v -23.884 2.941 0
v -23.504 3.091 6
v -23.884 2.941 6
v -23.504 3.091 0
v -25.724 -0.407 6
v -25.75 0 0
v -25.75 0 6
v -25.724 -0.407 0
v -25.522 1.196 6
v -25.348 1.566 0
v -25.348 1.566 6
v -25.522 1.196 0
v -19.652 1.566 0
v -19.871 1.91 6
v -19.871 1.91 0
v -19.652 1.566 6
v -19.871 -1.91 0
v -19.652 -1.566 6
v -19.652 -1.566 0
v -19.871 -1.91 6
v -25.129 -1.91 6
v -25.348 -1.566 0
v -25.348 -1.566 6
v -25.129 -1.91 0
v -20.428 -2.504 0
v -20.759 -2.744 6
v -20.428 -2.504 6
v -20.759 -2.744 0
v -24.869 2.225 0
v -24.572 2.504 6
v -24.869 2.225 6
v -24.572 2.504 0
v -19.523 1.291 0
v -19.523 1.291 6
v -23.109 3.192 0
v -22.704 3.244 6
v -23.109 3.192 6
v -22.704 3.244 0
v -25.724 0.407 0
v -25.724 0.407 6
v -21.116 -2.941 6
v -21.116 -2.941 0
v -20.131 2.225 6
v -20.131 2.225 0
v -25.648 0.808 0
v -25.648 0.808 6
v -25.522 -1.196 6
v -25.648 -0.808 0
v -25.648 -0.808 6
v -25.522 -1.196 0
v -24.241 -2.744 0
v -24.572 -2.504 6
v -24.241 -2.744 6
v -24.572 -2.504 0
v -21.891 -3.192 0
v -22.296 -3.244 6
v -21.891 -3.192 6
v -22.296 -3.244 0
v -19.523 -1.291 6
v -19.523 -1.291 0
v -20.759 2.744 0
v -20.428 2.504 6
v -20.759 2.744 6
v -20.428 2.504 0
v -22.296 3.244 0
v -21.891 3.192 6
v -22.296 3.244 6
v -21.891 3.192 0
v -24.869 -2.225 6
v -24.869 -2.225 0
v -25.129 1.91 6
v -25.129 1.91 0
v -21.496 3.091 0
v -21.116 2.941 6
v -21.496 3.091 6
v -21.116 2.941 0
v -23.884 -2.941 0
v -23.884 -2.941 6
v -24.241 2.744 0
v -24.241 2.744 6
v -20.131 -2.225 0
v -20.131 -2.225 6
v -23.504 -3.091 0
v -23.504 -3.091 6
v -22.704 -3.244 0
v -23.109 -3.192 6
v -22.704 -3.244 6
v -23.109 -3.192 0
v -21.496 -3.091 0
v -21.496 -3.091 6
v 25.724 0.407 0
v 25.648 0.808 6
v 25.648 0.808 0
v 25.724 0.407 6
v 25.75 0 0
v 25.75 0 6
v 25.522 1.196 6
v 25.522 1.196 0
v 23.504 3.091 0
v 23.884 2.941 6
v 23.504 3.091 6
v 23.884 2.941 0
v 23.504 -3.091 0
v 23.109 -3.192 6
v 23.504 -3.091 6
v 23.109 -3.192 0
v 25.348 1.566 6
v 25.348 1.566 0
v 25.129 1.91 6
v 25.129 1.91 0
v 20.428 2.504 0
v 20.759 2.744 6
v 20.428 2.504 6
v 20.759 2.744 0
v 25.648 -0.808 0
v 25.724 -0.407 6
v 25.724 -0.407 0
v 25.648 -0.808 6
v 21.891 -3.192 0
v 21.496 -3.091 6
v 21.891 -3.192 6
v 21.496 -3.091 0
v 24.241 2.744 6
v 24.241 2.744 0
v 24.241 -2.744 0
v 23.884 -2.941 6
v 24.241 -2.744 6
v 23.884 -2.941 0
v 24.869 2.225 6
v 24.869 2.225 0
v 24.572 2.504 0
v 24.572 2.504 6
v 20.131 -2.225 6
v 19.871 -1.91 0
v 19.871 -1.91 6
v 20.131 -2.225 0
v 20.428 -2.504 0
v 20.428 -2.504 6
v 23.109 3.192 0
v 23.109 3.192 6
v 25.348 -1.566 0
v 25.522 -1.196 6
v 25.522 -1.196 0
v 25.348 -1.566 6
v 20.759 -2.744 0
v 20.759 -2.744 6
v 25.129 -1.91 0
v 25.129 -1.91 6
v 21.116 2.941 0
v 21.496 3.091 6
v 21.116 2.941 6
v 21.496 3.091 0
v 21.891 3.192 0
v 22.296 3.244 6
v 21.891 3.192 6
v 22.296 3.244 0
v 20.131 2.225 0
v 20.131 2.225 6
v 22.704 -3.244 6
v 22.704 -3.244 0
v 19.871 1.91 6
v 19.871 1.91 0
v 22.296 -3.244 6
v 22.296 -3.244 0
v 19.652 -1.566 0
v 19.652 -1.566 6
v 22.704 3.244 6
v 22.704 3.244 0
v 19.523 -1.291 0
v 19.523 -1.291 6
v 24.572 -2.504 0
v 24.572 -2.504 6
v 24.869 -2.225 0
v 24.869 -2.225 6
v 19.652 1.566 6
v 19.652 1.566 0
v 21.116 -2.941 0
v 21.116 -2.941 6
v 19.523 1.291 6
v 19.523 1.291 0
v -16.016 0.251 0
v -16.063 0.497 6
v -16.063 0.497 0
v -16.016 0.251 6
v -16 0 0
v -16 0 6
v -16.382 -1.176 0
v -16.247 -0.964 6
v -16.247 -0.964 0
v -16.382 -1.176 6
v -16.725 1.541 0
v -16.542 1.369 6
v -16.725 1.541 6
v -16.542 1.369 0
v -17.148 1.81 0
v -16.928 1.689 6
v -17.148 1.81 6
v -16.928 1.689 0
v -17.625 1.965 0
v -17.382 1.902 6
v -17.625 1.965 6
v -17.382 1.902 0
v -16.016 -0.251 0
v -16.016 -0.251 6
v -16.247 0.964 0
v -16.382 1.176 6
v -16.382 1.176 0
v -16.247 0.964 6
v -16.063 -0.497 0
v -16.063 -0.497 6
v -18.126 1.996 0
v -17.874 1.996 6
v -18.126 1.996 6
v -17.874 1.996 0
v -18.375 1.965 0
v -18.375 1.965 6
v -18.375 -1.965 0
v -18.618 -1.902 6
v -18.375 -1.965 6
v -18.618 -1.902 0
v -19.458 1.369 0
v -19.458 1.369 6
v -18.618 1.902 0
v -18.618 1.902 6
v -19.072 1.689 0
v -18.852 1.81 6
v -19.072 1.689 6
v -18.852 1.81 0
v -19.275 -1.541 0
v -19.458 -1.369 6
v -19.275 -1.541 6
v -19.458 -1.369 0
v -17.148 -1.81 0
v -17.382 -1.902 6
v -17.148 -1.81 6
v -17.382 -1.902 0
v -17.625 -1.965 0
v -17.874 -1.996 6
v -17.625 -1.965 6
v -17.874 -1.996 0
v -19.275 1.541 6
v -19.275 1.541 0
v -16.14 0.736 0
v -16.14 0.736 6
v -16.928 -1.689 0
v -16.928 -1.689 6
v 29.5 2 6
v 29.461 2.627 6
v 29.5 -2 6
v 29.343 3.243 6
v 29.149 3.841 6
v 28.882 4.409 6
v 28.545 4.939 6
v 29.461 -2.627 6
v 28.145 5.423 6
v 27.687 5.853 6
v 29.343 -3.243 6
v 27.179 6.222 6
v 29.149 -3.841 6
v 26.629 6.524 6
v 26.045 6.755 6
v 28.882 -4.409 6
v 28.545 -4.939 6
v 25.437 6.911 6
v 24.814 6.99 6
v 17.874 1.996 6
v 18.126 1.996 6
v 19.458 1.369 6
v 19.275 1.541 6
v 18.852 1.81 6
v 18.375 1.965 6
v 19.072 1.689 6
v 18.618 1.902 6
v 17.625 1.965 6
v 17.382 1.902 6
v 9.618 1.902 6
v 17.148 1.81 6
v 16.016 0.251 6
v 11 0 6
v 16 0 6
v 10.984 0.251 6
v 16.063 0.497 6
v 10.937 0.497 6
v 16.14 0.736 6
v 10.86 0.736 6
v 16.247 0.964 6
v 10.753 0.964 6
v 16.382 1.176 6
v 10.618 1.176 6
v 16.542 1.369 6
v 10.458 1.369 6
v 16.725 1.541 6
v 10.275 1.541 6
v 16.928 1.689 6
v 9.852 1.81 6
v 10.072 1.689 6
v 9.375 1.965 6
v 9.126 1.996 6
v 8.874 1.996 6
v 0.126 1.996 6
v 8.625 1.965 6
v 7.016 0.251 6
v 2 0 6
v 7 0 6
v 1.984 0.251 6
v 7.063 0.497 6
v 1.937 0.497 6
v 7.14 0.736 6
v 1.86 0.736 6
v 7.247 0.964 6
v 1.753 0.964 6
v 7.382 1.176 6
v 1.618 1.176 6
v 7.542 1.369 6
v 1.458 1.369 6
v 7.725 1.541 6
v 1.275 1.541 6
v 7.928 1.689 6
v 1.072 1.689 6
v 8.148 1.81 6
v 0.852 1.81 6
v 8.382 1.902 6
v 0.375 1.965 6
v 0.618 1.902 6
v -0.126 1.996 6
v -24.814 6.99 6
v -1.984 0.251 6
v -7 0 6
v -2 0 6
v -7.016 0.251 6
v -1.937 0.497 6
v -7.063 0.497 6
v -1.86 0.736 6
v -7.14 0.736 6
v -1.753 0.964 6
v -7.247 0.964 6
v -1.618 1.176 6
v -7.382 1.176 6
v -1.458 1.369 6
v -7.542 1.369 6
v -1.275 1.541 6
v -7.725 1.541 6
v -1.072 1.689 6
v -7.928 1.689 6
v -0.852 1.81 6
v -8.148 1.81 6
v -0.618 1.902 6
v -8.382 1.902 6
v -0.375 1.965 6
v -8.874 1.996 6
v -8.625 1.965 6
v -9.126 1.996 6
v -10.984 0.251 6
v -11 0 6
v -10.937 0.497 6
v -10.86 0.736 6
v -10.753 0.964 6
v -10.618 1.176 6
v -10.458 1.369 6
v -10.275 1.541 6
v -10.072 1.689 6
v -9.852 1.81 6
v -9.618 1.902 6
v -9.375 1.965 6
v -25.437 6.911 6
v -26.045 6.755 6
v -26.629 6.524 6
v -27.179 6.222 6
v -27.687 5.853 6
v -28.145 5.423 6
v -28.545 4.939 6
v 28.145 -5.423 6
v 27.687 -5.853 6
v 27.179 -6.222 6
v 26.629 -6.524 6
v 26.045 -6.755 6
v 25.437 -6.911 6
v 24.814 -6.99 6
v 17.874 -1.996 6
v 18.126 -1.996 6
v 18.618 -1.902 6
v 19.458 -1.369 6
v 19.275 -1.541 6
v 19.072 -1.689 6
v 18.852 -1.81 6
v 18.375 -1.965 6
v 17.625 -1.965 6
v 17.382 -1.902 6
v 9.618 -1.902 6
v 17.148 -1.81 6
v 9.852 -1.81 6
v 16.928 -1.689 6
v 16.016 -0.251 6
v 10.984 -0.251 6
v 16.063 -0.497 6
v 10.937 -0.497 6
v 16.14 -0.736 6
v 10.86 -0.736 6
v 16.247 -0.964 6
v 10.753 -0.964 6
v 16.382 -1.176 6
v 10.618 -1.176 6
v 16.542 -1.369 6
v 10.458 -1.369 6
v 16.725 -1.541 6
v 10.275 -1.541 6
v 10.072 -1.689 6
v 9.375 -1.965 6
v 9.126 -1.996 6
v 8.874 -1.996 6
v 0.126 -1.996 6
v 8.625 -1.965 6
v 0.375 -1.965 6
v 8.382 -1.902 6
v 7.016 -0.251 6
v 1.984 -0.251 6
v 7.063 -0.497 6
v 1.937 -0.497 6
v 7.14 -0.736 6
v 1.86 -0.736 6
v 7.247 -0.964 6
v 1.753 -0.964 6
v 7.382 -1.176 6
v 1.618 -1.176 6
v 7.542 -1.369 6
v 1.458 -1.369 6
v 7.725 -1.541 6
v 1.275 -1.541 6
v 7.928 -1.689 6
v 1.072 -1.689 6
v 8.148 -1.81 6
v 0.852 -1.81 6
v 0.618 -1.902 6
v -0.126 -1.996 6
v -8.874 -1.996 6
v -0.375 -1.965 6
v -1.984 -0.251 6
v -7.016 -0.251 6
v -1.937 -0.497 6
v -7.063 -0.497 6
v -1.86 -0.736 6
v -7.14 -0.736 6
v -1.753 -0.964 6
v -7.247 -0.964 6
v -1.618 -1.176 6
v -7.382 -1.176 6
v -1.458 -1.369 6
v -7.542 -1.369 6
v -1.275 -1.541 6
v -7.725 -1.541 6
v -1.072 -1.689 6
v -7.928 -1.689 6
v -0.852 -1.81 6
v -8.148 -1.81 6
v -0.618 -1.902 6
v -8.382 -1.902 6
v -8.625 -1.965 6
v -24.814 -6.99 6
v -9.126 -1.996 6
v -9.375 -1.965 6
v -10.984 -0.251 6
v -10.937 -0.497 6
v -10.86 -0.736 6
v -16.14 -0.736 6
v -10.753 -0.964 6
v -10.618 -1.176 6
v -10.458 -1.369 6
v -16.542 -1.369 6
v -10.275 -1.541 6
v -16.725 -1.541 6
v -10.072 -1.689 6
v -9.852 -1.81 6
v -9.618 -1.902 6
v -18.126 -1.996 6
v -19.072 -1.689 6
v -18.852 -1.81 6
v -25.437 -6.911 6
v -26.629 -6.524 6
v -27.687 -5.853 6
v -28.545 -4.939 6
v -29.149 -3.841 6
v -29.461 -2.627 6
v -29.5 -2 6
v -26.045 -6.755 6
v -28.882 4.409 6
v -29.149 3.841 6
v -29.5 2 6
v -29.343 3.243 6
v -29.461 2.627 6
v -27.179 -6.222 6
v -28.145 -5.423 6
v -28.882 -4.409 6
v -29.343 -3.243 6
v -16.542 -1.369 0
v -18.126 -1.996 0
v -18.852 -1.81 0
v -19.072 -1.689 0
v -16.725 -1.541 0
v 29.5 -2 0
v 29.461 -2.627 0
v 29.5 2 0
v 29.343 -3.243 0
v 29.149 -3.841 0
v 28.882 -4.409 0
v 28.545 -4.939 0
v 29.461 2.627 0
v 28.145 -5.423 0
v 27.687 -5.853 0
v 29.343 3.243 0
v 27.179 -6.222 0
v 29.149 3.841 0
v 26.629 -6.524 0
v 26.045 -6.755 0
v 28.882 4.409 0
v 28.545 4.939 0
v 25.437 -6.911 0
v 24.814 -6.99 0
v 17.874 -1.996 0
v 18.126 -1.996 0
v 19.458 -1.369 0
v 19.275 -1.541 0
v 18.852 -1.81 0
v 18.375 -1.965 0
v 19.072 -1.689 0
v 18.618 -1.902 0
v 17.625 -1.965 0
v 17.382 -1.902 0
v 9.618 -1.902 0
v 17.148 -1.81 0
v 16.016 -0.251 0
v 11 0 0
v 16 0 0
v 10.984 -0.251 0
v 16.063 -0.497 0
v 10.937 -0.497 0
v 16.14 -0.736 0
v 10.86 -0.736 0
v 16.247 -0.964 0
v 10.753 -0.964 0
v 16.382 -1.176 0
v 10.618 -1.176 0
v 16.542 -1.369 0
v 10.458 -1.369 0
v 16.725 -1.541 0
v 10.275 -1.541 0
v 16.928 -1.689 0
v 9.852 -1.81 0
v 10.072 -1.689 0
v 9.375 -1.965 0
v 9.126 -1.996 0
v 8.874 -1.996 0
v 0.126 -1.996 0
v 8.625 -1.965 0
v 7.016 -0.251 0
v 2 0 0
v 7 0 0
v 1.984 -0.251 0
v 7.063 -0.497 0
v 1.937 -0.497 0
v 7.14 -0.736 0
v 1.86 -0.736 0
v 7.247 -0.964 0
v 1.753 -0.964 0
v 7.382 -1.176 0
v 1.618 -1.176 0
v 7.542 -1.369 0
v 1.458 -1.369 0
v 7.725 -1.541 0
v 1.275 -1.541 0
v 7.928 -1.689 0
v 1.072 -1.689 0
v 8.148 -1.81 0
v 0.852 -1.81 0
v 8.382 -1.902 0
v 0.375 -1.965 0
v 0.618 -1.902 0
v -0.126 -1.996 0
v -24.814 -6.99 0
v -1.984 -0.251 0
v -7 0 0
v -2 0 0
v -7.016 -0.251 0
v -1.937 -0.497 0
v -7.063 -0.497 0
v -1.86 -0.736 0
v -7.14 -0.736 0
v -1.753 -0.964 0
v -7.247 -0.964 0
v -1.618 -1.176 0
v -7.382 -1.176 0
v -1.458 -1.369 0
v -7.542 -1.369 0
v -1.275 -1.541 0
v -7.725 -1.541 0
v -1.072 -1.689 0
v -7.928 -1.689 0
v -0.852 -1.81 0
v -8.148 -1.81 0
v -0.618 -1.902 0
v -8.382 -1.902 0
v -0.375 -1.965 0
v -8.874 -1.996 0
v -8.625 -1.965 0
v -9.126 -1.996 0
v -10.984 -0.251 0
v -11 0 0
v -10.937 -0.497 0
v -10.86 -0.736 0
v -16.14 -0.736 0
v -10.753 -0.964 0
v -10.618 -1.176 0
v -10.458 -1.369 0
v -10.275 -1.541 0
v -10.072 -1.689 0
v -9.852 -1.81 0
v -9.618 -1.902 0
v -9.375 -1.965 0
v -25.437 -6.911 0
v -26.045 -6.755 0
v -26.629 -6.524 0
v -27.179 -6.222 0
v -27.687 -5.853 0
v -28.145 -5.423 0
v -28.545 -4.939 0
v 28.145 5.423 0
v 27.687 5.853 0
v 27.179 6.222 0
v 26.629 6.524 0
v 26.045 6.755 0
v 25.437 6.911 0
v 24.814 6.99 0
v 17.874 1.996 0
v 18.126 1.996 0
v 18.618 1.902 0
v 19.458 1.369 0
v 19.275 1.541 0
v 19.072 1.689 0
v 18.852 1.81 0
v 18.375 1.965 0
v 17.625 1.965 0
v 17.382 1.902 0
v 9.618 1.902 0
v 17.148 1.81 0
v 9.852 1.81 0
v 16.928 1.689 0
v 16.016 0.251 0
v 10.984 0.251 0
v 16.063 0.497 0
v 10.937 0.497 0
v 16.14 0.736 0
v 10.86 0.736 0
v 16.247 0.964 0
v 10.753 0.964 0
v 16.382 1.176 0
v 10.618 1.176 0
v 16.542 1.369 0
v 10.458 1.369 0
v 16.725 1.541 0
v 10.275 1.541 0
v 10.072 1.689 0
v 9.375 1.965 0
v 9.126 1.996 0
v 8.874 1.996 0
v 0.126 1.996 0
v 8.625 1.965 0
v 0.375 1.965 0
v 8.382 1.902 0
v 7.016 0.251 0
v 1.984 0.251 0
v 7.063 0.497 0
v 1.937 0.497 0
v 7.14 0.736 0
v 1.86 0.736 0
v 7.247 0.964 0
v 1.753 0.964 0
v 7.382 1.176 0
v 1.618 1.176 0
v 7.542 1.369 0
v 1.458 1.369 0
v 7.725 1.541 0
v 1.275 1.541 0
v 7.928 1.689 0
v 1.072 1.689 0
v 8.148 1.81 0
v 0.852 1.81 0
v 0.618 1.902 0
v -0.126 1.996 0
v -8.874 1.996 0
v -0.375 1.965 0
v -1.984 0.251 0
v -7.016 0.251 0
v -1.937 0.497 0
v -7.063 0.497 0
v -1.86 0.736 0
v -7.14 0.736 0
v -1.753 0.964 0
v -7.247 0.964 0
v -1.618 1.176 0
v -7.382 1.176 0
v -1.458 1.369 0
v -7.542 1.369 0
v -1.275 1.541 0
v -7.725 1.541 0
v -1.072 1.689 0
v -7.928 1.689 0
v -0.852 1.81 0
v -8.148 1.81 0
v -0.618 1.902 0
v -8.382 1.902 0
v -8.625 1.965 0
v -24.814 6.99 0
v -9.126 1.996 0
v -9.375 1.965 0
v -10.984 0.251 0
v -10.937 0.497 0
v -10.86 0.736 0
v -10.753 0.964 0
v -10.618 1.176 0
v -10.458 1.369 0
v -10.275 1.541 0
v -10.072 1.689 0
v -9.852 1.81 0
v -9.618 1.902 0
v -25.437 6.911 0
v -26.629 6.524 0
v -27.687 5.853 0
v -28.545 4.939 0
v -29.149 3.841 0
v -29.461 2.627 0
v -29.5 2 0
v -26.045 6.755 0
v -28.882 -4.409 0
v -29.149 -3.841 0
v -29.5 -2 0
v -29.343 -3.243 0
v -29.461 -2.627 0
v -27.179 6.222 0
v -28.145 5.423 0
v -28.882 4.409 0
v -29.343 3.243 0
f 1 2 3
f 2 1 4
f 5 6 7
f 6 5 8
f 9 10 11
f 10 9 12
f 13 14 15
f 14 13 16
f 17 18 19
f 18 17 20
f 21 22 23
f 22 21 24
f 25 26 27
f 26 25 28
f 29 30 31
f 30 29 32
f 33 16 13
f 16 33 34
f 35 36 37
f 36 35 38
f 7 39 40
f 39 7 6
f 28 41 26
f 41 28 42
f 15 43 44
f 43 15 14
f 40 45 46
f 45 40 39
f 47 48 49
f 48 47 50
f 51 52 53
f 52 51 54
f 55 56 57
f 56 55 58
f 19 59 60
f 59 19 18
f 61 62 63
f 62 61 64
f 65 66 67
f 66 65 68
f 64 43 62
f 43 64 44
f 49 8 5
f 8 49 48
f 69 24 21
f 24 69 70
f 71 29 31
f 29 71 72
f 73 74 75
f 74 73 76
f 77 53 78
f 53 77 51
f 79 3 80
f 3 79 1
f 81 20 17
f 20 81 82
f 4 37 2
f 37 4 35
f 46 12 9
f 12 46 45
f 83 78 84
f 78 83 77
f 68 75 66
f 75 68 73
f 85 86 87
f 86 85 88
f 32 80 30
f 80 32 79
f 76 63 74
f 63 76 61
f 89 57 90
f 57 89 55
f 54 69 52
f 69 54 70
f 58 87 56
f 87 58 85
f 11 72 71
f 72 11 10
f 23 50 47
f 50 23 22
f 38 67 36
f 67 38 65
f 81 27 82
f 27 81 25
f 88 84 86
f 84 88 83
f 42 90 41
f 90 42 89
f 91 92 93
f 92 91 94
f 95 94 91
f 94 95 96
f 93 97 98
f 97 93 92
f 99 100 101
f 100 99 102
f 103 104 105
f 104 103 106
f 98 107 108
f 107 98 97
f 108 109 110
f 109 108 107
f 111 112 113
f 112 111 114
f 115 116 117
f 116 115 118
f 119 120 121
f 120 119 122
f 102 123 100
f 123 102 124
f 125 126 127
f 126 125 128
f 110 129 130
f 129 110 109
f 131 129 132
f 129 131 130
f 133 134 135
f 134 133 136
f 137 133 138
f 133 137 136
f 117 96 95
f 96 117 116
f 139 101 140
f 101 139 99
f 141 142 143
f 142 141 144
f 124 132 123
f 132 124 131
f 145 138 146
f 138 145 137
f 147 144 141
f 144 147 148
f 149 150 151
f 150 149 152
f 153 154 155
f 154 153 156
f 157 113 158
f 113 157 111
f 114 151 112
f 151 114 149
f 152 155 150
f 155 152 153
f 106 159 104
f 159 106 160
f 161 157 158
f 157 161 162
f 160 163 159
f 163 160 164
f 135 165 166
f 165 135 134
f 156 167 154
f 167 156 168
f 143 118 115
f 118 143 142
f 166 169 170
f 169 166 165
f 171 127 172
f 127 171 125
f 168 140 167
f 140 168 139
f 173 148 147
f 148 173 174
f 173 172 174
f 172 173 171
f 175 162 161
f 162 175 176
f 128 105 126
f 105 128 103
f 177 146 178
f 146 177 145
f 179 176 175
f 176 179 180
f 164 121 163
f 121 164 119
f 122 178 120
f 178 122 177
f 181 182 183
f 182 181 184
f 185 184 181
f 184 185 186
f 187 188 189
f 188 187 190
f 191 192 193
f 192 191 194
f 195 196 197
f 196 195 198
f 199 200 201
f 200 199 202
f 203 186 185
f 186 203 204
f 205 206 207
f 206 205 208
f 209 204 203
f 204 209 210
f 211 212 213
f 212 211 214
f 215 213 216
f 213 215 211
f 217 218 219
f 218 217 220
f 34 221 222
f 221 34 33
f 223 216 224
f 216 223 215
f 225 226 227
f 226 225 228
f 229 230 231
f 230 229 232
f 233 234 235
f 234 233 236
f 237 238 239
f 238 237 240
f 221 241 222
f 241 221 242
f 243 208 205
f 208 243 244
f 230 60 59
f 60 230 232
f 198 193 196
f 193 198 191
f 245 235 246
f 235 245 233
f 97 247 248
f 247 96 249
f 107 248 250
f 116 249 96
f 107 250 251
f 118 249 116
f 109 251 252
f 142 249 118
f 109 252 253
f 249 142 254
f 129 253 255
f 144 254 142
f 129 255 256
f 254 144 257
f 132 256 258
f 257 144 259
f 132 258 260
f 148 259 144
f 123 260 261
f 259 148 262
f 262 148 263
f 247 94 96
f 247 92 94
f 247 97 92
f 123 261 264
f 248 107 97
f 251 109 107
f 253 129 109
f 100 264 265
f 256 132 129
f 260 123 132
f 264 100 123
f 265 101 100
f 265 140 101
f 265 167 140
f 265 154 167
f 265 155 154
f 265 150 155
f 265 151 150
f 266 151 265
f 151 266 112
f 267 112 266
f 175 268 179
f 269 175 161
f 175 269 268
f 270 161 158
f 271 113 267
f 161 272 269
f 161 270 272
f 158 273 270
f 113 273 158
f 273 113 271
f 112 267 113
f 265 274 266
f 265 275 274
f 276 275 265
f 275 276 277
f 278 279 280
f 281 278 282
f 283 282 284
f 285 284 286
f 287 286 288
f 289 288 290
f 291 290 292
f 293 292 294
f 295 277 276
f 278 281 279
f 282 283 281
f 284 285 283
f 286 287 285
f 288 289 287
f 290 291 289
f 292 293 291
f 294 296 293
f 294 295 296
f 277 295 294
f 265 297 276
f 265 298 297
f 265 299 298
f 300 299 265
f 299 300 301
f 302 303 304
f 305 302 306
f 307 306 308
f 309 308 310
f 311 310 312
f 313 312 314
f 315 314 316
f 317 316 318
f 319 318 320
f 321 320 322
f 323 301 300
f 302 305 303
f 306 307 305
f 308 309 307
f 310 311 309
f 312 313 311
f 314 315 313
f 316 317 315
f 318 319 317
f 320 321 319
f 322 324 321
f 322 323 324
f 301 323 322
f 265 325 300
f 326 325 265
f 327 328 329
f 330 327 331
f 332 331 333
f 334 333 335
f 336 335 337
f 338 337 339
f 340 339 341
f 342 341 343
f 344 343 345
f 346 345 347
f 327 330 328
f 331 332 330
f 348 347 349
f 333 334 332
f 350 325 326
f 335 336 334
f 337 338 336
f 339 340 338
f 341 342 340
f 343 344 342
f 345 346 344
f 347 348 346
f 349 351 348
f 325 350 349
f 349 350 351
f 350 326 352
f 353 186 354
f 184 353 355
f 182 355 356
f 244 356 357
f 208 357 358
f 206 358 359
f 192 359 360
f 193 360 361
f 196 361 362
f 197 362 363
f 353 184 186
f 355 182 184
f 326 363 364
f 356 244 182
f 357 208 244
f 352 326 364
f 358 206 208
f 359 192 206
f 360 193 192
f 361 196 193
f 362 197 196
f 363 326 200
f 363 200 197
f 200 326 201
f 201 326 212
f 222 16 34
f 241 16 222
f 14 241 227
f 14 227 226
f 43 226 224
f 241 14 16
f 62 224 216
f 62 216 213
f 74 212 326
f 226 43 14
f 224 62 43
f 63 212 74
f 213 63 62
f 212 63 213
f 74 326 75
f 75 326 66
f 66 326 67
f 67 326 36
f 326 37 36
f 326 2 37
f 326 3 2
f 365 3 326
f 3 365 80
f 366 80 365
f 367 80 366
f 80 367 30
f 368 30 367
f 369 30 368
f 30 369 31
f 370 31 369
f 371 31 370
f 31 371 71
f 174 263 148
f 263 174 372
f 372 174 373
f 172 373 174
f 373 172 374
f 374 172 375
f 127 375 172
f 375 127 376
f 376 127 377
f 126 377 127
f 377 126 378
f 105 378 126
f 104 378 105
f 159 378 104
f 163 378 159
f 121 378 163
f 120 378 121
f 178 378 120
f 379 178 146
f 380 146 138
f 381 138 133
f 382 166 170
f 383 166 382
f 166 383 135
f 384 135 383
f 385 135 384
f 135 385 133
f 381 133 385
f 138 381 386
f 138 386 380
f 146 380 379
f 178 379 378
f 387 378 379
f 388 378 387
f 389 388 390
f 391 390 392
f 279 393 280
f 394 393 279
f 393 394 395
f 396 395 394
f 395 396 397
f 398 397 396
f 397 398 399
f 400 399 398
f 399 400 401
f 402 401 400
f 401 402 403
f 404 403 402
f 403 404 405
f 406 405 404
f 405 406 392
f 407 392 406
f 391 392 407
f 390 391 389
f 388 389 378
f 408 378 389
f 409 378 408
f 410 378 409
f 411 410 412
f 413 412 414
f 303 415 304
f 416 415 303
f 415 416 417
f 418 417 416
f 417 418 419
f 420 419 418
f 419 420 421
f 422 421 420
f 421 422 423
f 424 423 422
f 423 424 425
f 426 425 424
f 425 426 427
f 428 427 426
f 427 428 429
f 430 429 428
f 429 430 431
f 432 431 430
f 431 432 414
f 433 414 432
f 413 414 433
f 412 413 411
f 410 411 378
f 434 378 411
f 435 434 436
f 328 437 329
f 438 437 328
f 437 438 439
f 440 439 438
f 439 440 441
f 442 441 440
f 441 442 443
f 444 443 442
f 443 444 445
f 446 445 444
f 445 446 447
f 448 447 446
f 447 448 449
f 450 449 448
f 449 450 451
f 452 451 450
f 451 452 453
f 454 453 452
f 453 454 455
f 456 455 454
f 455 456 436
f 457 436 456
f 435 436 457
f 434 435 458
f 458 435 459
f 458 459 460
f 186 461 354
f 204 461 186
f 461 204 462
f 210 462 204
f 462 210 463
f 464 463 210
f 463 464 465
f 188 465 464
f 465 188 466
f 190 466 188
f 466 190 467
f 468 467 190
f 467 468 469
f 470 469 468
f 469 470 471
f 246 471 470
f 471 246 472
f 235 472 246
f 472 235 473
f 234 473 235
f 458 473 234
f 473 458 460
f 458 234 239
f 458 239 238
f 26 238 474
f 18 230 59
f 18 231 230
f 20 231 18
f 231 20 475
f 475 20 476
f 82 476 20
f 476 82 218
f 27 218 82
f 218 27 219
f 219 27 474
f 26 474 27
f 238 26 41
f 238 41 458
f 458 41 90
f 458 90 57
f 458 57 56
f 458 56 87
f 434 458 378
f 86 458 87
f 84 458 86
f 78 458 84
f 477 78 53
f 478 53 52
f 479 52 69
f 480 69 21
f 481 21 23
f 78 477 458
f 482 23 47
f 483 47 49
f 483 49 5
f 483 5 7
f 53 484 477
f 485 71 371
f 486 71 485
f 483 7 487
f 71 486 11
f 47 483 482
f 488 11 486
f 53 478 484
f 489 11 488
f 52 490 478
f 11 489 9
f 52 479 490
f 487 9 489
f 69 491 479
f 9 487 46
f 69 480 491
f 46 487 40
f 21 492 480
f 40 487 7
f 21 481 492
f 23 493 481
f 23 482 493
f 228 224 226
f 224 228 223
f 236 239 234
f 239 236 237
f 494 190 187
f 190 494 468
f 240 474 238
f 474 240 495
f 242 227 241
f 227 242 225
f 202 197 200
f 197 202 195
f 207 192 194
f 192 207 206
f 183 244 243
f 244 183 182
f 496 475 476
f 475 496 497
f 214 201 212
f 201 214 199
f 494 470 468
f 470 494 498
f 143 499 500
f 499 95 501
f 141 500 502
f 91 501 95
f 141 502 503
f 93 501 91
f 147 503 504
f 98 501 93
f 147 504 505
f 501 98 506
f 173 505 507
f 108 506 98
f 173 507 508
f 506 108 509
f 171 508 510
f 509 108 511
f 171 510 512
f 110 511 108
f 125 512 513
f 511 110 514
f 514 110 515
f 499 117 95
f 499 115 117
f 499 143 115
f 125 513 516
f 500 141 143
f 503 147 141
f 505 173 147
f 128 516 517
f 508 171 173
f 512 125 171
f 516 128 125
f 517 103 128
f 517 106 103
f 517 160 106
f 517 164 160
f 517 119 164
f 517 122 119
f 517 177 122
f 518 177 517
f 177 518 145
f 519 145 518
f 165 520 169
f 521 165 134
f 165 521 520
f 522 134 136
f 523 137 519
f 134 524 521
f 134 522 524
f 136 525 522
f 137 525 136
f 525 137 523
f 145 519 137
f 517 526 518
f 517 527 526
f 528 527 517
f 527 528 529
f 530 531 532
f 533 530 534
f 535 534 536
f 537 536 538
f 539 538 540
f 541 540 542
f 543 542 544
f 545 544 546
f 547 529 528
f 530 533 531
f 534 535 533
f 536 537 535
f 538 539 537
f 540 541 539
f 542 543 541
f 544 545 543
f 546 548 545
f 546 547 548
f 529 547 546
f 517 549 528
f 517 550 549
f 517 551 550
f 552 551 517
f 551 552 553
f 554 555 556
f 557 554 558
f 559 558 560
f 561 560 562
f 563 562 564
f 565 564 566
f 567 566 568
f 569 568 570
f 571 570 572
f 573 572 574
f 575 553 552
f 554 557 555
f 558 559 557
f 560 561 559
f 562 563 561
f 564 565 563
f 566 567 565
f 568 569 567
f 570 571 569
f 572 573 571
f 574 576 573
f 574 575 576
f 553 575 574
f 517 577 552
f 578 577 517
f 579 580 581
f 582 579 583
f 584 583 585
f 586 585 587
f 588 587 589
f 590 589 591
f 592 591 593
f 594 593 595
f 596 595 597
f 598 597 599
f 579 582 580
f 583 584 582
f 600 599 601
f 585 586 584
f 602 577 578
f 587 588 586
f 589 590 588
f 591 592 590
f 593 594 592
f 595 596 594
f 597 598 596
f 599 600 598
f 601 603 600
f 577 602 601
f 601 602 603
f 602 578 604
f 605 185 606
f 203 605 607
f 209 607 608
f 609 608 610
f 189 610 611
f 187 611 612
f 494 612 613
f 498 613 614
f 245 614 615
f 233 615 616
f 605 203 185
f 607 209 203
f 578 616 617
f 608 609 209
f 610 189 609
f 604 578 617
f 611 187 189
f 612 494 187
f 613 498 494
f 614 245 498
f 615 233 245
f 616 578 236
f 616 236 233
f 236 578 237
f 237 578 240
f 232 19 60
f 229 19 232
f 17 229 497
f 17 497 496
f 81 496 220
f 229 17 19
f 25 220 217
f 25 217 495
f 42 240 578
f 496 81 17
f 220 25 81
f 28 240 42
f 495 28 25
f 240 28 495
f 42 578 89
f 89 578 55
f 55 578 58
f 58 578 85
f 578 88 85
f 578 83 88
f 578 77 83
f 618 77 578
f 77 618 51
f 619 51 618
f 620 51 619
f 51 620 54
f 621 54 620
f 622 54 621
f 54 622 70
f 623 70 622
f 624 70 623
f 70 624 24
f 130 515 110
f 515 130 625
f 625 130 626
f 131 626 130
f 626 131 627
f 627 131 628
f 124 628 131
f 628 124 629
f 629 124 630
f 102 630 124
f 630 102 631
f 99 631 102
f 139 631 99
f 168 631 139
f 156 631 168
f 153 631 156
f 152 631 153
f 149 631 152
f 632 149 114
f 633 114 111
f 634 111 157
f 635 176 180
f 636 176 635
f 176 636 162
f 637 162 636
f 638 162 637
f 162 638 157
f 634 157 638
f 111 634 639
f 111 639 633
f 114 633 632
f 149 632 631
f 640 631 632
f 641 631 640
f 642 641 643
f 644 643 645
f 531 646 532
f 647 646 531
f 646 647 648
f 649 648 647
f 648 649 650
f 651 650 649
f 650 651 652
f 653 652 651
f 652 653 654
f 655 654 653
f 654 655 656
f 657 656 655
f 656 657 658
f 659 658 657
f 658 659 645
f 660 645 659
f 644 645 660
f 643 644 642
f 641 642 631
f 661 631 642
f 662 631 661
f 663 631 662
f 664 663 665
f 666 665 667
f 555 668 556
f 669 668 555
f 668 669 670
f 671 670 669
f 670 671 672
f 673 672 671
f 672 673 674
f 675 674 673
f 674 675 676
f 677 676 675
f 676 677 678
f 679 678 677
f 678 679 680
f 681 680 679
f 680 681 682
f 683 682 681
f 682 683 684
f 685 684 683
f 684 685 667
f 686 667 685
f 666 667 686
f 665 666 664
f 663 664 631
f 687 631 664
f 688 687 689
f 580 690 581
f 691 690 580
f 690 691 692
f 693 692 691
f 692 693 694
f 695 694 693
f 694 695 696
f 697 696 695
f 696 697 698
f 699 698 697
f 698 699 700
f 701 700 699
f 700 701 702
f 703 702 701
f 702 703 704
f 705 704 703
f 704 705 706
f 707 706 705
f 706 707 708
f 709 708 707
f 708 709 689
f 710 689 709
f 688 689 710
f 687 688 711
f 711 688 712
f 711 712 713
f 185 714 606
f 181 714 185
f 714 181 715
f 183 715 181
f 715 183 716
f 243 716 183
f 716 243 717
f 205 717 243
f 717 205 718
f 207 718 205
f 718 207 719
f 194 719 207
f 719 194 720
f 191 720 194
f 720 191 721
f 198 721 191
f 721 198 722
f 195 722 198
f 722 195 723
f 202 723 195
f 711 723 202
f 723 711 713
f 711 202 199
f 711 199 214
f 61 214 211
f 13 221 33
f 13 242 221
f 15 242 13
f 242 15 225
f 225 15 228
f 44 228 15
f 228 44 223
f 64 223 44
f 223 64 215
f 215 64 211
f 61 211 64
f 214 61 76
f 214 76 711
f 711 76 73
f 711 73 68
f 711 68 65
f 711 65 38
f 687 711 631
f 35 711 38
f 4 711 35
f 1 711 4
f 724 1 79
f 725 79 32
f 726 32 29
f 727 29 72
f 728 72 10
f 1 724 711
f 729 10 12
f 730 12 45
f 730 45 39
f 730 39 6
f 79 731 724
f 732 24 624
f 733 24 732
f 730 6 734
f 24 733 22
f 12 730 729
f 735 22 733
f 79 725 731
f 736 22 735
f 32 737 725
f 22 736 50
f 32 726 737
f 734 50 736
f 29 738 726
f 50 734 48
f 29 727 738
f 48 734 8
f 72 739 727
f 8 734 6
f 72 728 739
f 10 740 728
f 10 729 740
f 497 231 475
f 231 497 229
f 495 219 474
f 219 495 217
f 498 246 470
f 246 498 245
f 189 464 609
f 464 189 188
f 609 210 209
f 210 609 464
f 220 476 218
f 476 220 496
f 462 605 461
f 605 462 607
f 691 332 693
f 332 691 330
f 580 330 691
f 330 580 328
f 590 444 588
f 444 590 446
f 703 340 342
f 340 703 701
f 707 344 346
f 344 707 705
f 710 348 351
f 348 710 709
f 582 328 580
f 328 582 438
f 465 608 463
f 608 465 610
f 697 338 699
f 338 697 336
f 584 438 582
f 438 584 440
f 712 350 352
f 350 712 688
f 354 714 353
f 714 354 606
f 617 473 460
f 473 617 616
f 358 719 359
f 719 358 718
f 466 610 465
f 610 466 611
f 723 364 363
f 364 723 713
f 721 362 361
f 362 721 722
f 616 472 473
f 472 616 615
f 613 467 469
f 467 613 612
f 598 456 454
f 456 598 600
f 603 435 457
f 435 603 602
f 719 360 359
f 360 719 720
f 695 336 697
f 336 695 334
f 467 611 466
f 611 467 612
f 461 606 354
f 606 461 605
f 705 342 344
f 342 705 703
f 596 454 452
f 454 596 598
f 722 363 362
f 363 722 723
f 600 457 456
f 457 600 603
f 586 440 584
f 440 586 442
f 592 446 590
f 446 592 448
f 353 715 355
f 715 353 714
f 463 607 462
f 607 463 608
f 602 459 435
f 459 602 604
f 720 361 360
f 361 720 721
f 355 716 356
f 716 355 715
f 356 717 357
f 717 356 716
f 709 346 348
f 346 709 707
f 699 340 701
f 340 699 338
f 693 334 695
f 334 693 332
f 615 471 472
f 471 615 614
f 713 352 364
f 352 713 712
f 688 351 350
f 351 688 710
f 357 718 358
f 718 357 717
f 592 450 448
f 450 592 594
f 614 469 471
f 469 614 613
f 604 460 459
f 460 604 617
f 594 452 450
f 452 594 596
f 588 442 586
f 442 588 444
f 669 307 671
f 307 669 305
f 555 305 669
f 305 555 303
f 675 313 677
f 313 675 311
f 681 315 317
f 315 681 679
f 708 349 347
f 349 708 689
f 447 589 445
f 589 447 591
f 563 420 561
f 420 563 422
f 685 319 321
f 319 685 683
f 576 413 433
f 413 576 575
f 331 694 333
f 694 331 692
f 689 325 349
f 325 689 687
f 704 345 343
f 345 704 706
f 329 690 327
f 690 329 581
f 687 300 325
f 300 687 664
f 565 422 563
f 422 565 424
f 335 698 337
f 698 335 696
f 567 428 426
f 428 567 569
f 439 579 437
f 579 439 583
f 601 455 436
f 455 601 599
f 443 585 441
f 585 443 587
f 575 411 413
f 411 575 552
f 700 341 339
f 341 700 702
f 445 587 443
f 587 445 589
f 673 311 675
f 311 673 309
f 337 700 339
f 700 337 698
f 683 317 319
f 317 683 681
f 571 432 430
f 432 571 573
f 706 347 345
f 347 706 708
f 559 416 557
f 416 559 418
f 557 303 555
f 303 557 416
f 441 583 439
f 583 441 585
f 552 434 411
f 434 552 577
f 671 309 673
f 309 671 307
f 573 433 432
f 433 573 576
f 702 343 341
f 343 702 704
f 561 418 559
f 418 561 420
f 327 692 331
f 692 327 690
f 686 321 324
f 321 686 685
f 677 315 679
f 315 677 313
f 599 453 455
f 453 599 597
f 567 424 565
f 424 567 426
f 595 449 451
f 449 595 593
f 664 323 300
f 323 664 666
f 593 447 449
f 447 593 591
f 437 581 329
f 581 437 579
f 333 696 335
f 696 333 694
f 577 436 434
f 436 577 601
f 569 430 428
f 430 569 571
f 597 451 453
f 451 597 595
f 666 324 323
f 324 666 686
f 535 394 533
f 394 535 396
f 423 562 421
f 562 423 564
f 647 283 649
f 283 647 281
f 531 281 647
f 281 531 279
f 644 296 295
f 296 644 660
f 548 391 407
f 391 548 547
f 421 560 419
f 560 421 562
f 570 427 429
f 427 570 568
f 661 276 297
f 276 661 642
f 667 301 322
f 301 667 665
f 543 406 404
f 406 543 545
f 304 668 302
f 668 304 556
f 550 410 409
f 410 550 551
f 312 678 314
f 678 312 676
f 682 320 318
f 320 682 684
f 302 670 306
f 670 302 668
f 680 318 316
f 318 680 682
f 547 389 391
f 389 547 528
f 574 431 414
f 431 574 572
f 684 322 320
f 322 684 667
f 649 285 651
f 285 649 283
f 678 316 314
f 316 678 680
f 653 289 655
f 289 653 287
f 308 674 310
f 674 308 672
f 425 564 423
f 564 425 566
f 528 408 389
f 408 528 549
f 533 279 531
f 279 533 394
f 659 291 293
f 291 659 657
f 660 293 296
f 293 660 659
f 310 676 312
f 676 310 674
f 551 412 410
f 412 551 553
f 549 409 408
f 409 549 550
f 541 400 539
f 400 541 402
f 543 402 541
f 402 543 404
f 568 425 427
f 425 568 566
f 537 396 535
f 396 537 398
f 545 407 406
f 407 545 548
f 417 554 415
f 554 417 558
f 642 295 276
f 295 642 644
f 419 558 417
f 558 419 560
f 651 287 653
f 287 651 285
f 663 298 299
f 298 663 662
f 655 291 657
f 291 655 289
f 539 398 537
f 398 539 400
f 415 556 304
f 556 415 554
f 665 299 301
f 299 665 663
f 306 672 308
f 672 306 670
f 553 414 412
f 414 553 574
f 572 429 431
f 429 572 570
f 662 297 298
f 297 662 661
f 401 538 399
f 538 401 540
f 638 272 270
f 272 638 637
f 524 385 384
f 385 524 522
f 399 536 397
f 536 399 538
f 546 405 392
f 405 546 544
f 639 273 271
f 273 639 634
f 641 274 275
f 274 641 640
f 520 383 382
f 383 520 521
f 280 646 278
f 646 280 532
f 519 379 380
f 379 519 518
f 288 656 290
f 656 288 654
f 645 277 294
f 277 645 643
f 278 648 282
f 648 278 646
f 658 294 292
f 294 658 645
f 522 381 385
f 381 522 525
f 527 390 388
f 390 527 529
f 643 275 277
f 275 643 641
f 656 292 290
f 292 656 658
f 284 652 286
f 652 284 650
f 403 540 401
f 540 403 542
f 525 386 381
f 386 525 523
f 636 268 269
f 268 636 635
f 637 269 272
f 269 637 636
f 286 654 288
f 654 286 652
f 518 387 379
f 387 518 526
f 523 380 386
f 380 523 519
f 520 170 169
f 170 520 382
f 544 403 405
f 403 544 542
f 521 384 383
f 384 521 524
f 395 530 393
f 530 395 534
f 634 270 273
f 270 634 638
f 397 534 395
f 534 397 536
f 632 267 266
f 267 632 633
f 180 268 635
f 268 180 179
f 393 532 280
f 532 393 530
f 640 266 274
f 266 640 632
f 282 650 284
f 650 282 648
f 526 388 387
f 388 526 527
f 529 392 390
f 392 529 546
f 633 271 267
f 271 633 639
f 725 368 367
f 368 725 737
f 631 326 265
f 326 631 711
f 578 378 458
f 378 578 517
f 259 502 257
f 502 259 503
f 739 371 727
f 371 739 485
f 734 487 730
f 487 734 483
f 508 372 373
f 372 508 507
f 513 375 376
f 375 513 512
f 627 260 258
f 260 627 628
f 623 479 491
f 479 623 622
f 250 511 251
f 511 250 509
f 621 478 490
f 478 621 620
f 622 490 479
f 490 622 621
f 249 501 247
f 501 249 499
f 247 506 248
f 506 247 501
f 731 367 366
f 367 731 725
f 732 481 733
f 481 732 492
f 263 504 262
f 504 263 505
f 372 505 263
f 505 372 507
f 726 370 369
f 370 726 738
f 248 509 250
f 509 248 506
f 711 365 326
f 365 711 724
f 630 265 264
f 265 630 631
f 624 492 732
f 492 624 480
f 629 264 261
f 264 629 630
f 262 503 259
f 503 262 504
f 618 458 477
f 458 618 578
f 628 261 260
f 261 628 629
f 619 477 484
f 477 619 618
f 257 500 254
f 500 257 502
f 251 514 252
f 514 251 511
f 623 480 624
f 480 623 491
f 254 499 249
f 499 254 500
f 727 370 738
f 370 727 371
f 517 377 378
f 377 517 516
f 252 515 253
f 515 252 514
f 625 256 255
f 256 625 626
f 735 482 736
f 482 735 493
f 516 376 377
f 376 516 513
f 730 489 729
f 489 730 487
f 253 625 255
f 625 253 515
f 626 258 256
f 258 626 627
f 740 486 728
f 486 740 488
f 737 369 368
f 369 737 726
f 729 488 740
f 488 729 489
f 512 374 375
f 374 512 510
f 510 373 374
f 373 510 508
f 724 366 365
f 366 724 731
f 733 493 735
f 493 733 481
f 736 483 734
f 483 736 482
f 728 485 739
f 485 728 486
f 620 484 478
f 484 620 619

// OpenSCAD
$fn = 50;

difference() {
	union() {
		hull() {
			translate(v = [-24.5, 2.0, 0]) {
				cylinder(h = 6, r = 5);
			}
			translate(v = [24.5, 2.0, 0]) {
				cylinder(h = 6, r = 5);
			}
			translate(v = [-24.5, -2.0, 0]) {
				cylinder(h = 6, r = 5);
			}
			translate(v = [24.5, -2.0, 0]) {
				cylinder(h = 6, r = 5);
			}
		}
	}
	union() {
		translate(v = [-22.5, 0.0, -100.0]) {
			cylinder(h = 200, r = 3.25);
		}
		translate(v = [22.5, 0.0, -100.0]) {
			cylinder(h = 200, r = 3.25);
		}
		translate(v = [-22.5, 0.0, -100.0]) {
			cylinder(h = 200, r = 1.8);
		}
		translate(v = [22.5, 0.0, -100.0]) {
			cylinder(h = 200, r = 1.8);
		}
		translate(v = [-18.0, 0, 0.0]) {
			cylinder(h = 6, r = 2.0);
		}
		translate(v = [-9.0, 0, 0.0]) {
			cylinder(h = 6, r = 2.0);
		}
		cylinder(h = 6, r = 2.0);
		translate(v = [9.0, 0, 0.0]) {
			cylinder(h = 6, r = 2.0);
		}
		translate(v = [18.0, 0, 0.0]) {
			cylinder(h = 6, r = 2.0);
		}
	}
}
